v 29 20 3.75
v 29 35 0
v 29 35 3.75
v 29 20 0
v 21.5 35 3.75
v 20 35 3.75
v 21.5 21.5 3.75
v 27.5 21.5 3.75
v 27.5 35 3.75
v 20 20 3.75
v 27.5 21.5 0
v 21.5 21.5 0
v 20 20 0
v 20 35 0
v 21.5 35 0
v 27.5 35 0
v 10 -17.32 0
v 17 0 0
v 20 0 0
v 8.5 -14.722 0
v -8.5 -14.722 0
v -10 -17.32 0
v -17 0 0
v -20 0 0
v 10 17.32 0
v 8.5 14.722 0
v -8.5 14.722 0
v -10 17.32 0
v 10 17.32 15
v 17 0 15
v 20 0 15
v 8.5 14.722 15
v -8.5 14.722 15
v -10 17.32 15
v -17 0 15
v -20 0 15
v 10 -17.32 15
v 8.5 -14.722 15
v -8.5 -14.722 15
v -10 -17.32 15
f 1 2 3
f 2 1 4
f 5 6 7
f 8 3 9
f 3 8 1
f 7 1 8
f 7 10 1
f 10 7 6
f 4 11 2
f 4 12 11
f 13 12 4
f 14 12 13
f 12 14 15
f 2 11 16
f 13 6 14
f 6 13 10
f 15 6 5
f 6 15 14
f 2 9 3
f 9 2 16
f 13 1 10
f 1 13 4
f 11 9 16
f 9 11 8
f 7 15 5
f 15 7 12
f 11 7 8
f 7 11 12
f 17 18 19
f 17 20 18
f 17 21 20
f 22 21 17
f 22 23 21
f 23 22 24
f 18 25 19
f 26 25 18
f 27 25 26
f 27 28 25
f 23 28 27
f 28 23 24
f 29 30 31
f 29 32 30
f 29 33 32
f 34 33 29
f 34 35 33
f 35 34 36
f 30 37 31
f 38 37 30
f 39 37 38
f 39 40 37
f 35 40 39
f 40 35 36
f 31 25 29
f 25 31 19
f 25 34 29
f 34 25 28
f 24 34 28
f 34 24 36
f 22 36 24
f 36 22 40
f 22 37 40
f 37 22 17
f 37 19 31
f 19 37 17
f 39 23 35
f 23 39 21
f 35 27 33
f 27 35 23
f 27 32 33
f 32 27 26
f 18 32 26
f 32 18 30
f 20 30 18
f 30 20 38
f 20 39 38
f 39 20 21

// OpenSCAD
radius = 20;
sides = 6;//[3:10]
thickness = 3;//[1:6]
sideHeight = 15;//[1:30]

linear_extrude( height = sideHeight)


shelf();

module shelf(){
    difference (){
        //corners

        circle (r=radius, $fn=sides);
{   
            circle ( r=radius-thickness, $fn=sides );
        }
    }
}




module tab(){
    difference(){
 cube([3*thickness,sideHeight,sideHeight/4]); 
      translate([thickness/2,thickness/2,0])  
 cube([2*thickness,2*radius,sideHeight]);
    }

}
translate([radius,radius,0])
tab();
